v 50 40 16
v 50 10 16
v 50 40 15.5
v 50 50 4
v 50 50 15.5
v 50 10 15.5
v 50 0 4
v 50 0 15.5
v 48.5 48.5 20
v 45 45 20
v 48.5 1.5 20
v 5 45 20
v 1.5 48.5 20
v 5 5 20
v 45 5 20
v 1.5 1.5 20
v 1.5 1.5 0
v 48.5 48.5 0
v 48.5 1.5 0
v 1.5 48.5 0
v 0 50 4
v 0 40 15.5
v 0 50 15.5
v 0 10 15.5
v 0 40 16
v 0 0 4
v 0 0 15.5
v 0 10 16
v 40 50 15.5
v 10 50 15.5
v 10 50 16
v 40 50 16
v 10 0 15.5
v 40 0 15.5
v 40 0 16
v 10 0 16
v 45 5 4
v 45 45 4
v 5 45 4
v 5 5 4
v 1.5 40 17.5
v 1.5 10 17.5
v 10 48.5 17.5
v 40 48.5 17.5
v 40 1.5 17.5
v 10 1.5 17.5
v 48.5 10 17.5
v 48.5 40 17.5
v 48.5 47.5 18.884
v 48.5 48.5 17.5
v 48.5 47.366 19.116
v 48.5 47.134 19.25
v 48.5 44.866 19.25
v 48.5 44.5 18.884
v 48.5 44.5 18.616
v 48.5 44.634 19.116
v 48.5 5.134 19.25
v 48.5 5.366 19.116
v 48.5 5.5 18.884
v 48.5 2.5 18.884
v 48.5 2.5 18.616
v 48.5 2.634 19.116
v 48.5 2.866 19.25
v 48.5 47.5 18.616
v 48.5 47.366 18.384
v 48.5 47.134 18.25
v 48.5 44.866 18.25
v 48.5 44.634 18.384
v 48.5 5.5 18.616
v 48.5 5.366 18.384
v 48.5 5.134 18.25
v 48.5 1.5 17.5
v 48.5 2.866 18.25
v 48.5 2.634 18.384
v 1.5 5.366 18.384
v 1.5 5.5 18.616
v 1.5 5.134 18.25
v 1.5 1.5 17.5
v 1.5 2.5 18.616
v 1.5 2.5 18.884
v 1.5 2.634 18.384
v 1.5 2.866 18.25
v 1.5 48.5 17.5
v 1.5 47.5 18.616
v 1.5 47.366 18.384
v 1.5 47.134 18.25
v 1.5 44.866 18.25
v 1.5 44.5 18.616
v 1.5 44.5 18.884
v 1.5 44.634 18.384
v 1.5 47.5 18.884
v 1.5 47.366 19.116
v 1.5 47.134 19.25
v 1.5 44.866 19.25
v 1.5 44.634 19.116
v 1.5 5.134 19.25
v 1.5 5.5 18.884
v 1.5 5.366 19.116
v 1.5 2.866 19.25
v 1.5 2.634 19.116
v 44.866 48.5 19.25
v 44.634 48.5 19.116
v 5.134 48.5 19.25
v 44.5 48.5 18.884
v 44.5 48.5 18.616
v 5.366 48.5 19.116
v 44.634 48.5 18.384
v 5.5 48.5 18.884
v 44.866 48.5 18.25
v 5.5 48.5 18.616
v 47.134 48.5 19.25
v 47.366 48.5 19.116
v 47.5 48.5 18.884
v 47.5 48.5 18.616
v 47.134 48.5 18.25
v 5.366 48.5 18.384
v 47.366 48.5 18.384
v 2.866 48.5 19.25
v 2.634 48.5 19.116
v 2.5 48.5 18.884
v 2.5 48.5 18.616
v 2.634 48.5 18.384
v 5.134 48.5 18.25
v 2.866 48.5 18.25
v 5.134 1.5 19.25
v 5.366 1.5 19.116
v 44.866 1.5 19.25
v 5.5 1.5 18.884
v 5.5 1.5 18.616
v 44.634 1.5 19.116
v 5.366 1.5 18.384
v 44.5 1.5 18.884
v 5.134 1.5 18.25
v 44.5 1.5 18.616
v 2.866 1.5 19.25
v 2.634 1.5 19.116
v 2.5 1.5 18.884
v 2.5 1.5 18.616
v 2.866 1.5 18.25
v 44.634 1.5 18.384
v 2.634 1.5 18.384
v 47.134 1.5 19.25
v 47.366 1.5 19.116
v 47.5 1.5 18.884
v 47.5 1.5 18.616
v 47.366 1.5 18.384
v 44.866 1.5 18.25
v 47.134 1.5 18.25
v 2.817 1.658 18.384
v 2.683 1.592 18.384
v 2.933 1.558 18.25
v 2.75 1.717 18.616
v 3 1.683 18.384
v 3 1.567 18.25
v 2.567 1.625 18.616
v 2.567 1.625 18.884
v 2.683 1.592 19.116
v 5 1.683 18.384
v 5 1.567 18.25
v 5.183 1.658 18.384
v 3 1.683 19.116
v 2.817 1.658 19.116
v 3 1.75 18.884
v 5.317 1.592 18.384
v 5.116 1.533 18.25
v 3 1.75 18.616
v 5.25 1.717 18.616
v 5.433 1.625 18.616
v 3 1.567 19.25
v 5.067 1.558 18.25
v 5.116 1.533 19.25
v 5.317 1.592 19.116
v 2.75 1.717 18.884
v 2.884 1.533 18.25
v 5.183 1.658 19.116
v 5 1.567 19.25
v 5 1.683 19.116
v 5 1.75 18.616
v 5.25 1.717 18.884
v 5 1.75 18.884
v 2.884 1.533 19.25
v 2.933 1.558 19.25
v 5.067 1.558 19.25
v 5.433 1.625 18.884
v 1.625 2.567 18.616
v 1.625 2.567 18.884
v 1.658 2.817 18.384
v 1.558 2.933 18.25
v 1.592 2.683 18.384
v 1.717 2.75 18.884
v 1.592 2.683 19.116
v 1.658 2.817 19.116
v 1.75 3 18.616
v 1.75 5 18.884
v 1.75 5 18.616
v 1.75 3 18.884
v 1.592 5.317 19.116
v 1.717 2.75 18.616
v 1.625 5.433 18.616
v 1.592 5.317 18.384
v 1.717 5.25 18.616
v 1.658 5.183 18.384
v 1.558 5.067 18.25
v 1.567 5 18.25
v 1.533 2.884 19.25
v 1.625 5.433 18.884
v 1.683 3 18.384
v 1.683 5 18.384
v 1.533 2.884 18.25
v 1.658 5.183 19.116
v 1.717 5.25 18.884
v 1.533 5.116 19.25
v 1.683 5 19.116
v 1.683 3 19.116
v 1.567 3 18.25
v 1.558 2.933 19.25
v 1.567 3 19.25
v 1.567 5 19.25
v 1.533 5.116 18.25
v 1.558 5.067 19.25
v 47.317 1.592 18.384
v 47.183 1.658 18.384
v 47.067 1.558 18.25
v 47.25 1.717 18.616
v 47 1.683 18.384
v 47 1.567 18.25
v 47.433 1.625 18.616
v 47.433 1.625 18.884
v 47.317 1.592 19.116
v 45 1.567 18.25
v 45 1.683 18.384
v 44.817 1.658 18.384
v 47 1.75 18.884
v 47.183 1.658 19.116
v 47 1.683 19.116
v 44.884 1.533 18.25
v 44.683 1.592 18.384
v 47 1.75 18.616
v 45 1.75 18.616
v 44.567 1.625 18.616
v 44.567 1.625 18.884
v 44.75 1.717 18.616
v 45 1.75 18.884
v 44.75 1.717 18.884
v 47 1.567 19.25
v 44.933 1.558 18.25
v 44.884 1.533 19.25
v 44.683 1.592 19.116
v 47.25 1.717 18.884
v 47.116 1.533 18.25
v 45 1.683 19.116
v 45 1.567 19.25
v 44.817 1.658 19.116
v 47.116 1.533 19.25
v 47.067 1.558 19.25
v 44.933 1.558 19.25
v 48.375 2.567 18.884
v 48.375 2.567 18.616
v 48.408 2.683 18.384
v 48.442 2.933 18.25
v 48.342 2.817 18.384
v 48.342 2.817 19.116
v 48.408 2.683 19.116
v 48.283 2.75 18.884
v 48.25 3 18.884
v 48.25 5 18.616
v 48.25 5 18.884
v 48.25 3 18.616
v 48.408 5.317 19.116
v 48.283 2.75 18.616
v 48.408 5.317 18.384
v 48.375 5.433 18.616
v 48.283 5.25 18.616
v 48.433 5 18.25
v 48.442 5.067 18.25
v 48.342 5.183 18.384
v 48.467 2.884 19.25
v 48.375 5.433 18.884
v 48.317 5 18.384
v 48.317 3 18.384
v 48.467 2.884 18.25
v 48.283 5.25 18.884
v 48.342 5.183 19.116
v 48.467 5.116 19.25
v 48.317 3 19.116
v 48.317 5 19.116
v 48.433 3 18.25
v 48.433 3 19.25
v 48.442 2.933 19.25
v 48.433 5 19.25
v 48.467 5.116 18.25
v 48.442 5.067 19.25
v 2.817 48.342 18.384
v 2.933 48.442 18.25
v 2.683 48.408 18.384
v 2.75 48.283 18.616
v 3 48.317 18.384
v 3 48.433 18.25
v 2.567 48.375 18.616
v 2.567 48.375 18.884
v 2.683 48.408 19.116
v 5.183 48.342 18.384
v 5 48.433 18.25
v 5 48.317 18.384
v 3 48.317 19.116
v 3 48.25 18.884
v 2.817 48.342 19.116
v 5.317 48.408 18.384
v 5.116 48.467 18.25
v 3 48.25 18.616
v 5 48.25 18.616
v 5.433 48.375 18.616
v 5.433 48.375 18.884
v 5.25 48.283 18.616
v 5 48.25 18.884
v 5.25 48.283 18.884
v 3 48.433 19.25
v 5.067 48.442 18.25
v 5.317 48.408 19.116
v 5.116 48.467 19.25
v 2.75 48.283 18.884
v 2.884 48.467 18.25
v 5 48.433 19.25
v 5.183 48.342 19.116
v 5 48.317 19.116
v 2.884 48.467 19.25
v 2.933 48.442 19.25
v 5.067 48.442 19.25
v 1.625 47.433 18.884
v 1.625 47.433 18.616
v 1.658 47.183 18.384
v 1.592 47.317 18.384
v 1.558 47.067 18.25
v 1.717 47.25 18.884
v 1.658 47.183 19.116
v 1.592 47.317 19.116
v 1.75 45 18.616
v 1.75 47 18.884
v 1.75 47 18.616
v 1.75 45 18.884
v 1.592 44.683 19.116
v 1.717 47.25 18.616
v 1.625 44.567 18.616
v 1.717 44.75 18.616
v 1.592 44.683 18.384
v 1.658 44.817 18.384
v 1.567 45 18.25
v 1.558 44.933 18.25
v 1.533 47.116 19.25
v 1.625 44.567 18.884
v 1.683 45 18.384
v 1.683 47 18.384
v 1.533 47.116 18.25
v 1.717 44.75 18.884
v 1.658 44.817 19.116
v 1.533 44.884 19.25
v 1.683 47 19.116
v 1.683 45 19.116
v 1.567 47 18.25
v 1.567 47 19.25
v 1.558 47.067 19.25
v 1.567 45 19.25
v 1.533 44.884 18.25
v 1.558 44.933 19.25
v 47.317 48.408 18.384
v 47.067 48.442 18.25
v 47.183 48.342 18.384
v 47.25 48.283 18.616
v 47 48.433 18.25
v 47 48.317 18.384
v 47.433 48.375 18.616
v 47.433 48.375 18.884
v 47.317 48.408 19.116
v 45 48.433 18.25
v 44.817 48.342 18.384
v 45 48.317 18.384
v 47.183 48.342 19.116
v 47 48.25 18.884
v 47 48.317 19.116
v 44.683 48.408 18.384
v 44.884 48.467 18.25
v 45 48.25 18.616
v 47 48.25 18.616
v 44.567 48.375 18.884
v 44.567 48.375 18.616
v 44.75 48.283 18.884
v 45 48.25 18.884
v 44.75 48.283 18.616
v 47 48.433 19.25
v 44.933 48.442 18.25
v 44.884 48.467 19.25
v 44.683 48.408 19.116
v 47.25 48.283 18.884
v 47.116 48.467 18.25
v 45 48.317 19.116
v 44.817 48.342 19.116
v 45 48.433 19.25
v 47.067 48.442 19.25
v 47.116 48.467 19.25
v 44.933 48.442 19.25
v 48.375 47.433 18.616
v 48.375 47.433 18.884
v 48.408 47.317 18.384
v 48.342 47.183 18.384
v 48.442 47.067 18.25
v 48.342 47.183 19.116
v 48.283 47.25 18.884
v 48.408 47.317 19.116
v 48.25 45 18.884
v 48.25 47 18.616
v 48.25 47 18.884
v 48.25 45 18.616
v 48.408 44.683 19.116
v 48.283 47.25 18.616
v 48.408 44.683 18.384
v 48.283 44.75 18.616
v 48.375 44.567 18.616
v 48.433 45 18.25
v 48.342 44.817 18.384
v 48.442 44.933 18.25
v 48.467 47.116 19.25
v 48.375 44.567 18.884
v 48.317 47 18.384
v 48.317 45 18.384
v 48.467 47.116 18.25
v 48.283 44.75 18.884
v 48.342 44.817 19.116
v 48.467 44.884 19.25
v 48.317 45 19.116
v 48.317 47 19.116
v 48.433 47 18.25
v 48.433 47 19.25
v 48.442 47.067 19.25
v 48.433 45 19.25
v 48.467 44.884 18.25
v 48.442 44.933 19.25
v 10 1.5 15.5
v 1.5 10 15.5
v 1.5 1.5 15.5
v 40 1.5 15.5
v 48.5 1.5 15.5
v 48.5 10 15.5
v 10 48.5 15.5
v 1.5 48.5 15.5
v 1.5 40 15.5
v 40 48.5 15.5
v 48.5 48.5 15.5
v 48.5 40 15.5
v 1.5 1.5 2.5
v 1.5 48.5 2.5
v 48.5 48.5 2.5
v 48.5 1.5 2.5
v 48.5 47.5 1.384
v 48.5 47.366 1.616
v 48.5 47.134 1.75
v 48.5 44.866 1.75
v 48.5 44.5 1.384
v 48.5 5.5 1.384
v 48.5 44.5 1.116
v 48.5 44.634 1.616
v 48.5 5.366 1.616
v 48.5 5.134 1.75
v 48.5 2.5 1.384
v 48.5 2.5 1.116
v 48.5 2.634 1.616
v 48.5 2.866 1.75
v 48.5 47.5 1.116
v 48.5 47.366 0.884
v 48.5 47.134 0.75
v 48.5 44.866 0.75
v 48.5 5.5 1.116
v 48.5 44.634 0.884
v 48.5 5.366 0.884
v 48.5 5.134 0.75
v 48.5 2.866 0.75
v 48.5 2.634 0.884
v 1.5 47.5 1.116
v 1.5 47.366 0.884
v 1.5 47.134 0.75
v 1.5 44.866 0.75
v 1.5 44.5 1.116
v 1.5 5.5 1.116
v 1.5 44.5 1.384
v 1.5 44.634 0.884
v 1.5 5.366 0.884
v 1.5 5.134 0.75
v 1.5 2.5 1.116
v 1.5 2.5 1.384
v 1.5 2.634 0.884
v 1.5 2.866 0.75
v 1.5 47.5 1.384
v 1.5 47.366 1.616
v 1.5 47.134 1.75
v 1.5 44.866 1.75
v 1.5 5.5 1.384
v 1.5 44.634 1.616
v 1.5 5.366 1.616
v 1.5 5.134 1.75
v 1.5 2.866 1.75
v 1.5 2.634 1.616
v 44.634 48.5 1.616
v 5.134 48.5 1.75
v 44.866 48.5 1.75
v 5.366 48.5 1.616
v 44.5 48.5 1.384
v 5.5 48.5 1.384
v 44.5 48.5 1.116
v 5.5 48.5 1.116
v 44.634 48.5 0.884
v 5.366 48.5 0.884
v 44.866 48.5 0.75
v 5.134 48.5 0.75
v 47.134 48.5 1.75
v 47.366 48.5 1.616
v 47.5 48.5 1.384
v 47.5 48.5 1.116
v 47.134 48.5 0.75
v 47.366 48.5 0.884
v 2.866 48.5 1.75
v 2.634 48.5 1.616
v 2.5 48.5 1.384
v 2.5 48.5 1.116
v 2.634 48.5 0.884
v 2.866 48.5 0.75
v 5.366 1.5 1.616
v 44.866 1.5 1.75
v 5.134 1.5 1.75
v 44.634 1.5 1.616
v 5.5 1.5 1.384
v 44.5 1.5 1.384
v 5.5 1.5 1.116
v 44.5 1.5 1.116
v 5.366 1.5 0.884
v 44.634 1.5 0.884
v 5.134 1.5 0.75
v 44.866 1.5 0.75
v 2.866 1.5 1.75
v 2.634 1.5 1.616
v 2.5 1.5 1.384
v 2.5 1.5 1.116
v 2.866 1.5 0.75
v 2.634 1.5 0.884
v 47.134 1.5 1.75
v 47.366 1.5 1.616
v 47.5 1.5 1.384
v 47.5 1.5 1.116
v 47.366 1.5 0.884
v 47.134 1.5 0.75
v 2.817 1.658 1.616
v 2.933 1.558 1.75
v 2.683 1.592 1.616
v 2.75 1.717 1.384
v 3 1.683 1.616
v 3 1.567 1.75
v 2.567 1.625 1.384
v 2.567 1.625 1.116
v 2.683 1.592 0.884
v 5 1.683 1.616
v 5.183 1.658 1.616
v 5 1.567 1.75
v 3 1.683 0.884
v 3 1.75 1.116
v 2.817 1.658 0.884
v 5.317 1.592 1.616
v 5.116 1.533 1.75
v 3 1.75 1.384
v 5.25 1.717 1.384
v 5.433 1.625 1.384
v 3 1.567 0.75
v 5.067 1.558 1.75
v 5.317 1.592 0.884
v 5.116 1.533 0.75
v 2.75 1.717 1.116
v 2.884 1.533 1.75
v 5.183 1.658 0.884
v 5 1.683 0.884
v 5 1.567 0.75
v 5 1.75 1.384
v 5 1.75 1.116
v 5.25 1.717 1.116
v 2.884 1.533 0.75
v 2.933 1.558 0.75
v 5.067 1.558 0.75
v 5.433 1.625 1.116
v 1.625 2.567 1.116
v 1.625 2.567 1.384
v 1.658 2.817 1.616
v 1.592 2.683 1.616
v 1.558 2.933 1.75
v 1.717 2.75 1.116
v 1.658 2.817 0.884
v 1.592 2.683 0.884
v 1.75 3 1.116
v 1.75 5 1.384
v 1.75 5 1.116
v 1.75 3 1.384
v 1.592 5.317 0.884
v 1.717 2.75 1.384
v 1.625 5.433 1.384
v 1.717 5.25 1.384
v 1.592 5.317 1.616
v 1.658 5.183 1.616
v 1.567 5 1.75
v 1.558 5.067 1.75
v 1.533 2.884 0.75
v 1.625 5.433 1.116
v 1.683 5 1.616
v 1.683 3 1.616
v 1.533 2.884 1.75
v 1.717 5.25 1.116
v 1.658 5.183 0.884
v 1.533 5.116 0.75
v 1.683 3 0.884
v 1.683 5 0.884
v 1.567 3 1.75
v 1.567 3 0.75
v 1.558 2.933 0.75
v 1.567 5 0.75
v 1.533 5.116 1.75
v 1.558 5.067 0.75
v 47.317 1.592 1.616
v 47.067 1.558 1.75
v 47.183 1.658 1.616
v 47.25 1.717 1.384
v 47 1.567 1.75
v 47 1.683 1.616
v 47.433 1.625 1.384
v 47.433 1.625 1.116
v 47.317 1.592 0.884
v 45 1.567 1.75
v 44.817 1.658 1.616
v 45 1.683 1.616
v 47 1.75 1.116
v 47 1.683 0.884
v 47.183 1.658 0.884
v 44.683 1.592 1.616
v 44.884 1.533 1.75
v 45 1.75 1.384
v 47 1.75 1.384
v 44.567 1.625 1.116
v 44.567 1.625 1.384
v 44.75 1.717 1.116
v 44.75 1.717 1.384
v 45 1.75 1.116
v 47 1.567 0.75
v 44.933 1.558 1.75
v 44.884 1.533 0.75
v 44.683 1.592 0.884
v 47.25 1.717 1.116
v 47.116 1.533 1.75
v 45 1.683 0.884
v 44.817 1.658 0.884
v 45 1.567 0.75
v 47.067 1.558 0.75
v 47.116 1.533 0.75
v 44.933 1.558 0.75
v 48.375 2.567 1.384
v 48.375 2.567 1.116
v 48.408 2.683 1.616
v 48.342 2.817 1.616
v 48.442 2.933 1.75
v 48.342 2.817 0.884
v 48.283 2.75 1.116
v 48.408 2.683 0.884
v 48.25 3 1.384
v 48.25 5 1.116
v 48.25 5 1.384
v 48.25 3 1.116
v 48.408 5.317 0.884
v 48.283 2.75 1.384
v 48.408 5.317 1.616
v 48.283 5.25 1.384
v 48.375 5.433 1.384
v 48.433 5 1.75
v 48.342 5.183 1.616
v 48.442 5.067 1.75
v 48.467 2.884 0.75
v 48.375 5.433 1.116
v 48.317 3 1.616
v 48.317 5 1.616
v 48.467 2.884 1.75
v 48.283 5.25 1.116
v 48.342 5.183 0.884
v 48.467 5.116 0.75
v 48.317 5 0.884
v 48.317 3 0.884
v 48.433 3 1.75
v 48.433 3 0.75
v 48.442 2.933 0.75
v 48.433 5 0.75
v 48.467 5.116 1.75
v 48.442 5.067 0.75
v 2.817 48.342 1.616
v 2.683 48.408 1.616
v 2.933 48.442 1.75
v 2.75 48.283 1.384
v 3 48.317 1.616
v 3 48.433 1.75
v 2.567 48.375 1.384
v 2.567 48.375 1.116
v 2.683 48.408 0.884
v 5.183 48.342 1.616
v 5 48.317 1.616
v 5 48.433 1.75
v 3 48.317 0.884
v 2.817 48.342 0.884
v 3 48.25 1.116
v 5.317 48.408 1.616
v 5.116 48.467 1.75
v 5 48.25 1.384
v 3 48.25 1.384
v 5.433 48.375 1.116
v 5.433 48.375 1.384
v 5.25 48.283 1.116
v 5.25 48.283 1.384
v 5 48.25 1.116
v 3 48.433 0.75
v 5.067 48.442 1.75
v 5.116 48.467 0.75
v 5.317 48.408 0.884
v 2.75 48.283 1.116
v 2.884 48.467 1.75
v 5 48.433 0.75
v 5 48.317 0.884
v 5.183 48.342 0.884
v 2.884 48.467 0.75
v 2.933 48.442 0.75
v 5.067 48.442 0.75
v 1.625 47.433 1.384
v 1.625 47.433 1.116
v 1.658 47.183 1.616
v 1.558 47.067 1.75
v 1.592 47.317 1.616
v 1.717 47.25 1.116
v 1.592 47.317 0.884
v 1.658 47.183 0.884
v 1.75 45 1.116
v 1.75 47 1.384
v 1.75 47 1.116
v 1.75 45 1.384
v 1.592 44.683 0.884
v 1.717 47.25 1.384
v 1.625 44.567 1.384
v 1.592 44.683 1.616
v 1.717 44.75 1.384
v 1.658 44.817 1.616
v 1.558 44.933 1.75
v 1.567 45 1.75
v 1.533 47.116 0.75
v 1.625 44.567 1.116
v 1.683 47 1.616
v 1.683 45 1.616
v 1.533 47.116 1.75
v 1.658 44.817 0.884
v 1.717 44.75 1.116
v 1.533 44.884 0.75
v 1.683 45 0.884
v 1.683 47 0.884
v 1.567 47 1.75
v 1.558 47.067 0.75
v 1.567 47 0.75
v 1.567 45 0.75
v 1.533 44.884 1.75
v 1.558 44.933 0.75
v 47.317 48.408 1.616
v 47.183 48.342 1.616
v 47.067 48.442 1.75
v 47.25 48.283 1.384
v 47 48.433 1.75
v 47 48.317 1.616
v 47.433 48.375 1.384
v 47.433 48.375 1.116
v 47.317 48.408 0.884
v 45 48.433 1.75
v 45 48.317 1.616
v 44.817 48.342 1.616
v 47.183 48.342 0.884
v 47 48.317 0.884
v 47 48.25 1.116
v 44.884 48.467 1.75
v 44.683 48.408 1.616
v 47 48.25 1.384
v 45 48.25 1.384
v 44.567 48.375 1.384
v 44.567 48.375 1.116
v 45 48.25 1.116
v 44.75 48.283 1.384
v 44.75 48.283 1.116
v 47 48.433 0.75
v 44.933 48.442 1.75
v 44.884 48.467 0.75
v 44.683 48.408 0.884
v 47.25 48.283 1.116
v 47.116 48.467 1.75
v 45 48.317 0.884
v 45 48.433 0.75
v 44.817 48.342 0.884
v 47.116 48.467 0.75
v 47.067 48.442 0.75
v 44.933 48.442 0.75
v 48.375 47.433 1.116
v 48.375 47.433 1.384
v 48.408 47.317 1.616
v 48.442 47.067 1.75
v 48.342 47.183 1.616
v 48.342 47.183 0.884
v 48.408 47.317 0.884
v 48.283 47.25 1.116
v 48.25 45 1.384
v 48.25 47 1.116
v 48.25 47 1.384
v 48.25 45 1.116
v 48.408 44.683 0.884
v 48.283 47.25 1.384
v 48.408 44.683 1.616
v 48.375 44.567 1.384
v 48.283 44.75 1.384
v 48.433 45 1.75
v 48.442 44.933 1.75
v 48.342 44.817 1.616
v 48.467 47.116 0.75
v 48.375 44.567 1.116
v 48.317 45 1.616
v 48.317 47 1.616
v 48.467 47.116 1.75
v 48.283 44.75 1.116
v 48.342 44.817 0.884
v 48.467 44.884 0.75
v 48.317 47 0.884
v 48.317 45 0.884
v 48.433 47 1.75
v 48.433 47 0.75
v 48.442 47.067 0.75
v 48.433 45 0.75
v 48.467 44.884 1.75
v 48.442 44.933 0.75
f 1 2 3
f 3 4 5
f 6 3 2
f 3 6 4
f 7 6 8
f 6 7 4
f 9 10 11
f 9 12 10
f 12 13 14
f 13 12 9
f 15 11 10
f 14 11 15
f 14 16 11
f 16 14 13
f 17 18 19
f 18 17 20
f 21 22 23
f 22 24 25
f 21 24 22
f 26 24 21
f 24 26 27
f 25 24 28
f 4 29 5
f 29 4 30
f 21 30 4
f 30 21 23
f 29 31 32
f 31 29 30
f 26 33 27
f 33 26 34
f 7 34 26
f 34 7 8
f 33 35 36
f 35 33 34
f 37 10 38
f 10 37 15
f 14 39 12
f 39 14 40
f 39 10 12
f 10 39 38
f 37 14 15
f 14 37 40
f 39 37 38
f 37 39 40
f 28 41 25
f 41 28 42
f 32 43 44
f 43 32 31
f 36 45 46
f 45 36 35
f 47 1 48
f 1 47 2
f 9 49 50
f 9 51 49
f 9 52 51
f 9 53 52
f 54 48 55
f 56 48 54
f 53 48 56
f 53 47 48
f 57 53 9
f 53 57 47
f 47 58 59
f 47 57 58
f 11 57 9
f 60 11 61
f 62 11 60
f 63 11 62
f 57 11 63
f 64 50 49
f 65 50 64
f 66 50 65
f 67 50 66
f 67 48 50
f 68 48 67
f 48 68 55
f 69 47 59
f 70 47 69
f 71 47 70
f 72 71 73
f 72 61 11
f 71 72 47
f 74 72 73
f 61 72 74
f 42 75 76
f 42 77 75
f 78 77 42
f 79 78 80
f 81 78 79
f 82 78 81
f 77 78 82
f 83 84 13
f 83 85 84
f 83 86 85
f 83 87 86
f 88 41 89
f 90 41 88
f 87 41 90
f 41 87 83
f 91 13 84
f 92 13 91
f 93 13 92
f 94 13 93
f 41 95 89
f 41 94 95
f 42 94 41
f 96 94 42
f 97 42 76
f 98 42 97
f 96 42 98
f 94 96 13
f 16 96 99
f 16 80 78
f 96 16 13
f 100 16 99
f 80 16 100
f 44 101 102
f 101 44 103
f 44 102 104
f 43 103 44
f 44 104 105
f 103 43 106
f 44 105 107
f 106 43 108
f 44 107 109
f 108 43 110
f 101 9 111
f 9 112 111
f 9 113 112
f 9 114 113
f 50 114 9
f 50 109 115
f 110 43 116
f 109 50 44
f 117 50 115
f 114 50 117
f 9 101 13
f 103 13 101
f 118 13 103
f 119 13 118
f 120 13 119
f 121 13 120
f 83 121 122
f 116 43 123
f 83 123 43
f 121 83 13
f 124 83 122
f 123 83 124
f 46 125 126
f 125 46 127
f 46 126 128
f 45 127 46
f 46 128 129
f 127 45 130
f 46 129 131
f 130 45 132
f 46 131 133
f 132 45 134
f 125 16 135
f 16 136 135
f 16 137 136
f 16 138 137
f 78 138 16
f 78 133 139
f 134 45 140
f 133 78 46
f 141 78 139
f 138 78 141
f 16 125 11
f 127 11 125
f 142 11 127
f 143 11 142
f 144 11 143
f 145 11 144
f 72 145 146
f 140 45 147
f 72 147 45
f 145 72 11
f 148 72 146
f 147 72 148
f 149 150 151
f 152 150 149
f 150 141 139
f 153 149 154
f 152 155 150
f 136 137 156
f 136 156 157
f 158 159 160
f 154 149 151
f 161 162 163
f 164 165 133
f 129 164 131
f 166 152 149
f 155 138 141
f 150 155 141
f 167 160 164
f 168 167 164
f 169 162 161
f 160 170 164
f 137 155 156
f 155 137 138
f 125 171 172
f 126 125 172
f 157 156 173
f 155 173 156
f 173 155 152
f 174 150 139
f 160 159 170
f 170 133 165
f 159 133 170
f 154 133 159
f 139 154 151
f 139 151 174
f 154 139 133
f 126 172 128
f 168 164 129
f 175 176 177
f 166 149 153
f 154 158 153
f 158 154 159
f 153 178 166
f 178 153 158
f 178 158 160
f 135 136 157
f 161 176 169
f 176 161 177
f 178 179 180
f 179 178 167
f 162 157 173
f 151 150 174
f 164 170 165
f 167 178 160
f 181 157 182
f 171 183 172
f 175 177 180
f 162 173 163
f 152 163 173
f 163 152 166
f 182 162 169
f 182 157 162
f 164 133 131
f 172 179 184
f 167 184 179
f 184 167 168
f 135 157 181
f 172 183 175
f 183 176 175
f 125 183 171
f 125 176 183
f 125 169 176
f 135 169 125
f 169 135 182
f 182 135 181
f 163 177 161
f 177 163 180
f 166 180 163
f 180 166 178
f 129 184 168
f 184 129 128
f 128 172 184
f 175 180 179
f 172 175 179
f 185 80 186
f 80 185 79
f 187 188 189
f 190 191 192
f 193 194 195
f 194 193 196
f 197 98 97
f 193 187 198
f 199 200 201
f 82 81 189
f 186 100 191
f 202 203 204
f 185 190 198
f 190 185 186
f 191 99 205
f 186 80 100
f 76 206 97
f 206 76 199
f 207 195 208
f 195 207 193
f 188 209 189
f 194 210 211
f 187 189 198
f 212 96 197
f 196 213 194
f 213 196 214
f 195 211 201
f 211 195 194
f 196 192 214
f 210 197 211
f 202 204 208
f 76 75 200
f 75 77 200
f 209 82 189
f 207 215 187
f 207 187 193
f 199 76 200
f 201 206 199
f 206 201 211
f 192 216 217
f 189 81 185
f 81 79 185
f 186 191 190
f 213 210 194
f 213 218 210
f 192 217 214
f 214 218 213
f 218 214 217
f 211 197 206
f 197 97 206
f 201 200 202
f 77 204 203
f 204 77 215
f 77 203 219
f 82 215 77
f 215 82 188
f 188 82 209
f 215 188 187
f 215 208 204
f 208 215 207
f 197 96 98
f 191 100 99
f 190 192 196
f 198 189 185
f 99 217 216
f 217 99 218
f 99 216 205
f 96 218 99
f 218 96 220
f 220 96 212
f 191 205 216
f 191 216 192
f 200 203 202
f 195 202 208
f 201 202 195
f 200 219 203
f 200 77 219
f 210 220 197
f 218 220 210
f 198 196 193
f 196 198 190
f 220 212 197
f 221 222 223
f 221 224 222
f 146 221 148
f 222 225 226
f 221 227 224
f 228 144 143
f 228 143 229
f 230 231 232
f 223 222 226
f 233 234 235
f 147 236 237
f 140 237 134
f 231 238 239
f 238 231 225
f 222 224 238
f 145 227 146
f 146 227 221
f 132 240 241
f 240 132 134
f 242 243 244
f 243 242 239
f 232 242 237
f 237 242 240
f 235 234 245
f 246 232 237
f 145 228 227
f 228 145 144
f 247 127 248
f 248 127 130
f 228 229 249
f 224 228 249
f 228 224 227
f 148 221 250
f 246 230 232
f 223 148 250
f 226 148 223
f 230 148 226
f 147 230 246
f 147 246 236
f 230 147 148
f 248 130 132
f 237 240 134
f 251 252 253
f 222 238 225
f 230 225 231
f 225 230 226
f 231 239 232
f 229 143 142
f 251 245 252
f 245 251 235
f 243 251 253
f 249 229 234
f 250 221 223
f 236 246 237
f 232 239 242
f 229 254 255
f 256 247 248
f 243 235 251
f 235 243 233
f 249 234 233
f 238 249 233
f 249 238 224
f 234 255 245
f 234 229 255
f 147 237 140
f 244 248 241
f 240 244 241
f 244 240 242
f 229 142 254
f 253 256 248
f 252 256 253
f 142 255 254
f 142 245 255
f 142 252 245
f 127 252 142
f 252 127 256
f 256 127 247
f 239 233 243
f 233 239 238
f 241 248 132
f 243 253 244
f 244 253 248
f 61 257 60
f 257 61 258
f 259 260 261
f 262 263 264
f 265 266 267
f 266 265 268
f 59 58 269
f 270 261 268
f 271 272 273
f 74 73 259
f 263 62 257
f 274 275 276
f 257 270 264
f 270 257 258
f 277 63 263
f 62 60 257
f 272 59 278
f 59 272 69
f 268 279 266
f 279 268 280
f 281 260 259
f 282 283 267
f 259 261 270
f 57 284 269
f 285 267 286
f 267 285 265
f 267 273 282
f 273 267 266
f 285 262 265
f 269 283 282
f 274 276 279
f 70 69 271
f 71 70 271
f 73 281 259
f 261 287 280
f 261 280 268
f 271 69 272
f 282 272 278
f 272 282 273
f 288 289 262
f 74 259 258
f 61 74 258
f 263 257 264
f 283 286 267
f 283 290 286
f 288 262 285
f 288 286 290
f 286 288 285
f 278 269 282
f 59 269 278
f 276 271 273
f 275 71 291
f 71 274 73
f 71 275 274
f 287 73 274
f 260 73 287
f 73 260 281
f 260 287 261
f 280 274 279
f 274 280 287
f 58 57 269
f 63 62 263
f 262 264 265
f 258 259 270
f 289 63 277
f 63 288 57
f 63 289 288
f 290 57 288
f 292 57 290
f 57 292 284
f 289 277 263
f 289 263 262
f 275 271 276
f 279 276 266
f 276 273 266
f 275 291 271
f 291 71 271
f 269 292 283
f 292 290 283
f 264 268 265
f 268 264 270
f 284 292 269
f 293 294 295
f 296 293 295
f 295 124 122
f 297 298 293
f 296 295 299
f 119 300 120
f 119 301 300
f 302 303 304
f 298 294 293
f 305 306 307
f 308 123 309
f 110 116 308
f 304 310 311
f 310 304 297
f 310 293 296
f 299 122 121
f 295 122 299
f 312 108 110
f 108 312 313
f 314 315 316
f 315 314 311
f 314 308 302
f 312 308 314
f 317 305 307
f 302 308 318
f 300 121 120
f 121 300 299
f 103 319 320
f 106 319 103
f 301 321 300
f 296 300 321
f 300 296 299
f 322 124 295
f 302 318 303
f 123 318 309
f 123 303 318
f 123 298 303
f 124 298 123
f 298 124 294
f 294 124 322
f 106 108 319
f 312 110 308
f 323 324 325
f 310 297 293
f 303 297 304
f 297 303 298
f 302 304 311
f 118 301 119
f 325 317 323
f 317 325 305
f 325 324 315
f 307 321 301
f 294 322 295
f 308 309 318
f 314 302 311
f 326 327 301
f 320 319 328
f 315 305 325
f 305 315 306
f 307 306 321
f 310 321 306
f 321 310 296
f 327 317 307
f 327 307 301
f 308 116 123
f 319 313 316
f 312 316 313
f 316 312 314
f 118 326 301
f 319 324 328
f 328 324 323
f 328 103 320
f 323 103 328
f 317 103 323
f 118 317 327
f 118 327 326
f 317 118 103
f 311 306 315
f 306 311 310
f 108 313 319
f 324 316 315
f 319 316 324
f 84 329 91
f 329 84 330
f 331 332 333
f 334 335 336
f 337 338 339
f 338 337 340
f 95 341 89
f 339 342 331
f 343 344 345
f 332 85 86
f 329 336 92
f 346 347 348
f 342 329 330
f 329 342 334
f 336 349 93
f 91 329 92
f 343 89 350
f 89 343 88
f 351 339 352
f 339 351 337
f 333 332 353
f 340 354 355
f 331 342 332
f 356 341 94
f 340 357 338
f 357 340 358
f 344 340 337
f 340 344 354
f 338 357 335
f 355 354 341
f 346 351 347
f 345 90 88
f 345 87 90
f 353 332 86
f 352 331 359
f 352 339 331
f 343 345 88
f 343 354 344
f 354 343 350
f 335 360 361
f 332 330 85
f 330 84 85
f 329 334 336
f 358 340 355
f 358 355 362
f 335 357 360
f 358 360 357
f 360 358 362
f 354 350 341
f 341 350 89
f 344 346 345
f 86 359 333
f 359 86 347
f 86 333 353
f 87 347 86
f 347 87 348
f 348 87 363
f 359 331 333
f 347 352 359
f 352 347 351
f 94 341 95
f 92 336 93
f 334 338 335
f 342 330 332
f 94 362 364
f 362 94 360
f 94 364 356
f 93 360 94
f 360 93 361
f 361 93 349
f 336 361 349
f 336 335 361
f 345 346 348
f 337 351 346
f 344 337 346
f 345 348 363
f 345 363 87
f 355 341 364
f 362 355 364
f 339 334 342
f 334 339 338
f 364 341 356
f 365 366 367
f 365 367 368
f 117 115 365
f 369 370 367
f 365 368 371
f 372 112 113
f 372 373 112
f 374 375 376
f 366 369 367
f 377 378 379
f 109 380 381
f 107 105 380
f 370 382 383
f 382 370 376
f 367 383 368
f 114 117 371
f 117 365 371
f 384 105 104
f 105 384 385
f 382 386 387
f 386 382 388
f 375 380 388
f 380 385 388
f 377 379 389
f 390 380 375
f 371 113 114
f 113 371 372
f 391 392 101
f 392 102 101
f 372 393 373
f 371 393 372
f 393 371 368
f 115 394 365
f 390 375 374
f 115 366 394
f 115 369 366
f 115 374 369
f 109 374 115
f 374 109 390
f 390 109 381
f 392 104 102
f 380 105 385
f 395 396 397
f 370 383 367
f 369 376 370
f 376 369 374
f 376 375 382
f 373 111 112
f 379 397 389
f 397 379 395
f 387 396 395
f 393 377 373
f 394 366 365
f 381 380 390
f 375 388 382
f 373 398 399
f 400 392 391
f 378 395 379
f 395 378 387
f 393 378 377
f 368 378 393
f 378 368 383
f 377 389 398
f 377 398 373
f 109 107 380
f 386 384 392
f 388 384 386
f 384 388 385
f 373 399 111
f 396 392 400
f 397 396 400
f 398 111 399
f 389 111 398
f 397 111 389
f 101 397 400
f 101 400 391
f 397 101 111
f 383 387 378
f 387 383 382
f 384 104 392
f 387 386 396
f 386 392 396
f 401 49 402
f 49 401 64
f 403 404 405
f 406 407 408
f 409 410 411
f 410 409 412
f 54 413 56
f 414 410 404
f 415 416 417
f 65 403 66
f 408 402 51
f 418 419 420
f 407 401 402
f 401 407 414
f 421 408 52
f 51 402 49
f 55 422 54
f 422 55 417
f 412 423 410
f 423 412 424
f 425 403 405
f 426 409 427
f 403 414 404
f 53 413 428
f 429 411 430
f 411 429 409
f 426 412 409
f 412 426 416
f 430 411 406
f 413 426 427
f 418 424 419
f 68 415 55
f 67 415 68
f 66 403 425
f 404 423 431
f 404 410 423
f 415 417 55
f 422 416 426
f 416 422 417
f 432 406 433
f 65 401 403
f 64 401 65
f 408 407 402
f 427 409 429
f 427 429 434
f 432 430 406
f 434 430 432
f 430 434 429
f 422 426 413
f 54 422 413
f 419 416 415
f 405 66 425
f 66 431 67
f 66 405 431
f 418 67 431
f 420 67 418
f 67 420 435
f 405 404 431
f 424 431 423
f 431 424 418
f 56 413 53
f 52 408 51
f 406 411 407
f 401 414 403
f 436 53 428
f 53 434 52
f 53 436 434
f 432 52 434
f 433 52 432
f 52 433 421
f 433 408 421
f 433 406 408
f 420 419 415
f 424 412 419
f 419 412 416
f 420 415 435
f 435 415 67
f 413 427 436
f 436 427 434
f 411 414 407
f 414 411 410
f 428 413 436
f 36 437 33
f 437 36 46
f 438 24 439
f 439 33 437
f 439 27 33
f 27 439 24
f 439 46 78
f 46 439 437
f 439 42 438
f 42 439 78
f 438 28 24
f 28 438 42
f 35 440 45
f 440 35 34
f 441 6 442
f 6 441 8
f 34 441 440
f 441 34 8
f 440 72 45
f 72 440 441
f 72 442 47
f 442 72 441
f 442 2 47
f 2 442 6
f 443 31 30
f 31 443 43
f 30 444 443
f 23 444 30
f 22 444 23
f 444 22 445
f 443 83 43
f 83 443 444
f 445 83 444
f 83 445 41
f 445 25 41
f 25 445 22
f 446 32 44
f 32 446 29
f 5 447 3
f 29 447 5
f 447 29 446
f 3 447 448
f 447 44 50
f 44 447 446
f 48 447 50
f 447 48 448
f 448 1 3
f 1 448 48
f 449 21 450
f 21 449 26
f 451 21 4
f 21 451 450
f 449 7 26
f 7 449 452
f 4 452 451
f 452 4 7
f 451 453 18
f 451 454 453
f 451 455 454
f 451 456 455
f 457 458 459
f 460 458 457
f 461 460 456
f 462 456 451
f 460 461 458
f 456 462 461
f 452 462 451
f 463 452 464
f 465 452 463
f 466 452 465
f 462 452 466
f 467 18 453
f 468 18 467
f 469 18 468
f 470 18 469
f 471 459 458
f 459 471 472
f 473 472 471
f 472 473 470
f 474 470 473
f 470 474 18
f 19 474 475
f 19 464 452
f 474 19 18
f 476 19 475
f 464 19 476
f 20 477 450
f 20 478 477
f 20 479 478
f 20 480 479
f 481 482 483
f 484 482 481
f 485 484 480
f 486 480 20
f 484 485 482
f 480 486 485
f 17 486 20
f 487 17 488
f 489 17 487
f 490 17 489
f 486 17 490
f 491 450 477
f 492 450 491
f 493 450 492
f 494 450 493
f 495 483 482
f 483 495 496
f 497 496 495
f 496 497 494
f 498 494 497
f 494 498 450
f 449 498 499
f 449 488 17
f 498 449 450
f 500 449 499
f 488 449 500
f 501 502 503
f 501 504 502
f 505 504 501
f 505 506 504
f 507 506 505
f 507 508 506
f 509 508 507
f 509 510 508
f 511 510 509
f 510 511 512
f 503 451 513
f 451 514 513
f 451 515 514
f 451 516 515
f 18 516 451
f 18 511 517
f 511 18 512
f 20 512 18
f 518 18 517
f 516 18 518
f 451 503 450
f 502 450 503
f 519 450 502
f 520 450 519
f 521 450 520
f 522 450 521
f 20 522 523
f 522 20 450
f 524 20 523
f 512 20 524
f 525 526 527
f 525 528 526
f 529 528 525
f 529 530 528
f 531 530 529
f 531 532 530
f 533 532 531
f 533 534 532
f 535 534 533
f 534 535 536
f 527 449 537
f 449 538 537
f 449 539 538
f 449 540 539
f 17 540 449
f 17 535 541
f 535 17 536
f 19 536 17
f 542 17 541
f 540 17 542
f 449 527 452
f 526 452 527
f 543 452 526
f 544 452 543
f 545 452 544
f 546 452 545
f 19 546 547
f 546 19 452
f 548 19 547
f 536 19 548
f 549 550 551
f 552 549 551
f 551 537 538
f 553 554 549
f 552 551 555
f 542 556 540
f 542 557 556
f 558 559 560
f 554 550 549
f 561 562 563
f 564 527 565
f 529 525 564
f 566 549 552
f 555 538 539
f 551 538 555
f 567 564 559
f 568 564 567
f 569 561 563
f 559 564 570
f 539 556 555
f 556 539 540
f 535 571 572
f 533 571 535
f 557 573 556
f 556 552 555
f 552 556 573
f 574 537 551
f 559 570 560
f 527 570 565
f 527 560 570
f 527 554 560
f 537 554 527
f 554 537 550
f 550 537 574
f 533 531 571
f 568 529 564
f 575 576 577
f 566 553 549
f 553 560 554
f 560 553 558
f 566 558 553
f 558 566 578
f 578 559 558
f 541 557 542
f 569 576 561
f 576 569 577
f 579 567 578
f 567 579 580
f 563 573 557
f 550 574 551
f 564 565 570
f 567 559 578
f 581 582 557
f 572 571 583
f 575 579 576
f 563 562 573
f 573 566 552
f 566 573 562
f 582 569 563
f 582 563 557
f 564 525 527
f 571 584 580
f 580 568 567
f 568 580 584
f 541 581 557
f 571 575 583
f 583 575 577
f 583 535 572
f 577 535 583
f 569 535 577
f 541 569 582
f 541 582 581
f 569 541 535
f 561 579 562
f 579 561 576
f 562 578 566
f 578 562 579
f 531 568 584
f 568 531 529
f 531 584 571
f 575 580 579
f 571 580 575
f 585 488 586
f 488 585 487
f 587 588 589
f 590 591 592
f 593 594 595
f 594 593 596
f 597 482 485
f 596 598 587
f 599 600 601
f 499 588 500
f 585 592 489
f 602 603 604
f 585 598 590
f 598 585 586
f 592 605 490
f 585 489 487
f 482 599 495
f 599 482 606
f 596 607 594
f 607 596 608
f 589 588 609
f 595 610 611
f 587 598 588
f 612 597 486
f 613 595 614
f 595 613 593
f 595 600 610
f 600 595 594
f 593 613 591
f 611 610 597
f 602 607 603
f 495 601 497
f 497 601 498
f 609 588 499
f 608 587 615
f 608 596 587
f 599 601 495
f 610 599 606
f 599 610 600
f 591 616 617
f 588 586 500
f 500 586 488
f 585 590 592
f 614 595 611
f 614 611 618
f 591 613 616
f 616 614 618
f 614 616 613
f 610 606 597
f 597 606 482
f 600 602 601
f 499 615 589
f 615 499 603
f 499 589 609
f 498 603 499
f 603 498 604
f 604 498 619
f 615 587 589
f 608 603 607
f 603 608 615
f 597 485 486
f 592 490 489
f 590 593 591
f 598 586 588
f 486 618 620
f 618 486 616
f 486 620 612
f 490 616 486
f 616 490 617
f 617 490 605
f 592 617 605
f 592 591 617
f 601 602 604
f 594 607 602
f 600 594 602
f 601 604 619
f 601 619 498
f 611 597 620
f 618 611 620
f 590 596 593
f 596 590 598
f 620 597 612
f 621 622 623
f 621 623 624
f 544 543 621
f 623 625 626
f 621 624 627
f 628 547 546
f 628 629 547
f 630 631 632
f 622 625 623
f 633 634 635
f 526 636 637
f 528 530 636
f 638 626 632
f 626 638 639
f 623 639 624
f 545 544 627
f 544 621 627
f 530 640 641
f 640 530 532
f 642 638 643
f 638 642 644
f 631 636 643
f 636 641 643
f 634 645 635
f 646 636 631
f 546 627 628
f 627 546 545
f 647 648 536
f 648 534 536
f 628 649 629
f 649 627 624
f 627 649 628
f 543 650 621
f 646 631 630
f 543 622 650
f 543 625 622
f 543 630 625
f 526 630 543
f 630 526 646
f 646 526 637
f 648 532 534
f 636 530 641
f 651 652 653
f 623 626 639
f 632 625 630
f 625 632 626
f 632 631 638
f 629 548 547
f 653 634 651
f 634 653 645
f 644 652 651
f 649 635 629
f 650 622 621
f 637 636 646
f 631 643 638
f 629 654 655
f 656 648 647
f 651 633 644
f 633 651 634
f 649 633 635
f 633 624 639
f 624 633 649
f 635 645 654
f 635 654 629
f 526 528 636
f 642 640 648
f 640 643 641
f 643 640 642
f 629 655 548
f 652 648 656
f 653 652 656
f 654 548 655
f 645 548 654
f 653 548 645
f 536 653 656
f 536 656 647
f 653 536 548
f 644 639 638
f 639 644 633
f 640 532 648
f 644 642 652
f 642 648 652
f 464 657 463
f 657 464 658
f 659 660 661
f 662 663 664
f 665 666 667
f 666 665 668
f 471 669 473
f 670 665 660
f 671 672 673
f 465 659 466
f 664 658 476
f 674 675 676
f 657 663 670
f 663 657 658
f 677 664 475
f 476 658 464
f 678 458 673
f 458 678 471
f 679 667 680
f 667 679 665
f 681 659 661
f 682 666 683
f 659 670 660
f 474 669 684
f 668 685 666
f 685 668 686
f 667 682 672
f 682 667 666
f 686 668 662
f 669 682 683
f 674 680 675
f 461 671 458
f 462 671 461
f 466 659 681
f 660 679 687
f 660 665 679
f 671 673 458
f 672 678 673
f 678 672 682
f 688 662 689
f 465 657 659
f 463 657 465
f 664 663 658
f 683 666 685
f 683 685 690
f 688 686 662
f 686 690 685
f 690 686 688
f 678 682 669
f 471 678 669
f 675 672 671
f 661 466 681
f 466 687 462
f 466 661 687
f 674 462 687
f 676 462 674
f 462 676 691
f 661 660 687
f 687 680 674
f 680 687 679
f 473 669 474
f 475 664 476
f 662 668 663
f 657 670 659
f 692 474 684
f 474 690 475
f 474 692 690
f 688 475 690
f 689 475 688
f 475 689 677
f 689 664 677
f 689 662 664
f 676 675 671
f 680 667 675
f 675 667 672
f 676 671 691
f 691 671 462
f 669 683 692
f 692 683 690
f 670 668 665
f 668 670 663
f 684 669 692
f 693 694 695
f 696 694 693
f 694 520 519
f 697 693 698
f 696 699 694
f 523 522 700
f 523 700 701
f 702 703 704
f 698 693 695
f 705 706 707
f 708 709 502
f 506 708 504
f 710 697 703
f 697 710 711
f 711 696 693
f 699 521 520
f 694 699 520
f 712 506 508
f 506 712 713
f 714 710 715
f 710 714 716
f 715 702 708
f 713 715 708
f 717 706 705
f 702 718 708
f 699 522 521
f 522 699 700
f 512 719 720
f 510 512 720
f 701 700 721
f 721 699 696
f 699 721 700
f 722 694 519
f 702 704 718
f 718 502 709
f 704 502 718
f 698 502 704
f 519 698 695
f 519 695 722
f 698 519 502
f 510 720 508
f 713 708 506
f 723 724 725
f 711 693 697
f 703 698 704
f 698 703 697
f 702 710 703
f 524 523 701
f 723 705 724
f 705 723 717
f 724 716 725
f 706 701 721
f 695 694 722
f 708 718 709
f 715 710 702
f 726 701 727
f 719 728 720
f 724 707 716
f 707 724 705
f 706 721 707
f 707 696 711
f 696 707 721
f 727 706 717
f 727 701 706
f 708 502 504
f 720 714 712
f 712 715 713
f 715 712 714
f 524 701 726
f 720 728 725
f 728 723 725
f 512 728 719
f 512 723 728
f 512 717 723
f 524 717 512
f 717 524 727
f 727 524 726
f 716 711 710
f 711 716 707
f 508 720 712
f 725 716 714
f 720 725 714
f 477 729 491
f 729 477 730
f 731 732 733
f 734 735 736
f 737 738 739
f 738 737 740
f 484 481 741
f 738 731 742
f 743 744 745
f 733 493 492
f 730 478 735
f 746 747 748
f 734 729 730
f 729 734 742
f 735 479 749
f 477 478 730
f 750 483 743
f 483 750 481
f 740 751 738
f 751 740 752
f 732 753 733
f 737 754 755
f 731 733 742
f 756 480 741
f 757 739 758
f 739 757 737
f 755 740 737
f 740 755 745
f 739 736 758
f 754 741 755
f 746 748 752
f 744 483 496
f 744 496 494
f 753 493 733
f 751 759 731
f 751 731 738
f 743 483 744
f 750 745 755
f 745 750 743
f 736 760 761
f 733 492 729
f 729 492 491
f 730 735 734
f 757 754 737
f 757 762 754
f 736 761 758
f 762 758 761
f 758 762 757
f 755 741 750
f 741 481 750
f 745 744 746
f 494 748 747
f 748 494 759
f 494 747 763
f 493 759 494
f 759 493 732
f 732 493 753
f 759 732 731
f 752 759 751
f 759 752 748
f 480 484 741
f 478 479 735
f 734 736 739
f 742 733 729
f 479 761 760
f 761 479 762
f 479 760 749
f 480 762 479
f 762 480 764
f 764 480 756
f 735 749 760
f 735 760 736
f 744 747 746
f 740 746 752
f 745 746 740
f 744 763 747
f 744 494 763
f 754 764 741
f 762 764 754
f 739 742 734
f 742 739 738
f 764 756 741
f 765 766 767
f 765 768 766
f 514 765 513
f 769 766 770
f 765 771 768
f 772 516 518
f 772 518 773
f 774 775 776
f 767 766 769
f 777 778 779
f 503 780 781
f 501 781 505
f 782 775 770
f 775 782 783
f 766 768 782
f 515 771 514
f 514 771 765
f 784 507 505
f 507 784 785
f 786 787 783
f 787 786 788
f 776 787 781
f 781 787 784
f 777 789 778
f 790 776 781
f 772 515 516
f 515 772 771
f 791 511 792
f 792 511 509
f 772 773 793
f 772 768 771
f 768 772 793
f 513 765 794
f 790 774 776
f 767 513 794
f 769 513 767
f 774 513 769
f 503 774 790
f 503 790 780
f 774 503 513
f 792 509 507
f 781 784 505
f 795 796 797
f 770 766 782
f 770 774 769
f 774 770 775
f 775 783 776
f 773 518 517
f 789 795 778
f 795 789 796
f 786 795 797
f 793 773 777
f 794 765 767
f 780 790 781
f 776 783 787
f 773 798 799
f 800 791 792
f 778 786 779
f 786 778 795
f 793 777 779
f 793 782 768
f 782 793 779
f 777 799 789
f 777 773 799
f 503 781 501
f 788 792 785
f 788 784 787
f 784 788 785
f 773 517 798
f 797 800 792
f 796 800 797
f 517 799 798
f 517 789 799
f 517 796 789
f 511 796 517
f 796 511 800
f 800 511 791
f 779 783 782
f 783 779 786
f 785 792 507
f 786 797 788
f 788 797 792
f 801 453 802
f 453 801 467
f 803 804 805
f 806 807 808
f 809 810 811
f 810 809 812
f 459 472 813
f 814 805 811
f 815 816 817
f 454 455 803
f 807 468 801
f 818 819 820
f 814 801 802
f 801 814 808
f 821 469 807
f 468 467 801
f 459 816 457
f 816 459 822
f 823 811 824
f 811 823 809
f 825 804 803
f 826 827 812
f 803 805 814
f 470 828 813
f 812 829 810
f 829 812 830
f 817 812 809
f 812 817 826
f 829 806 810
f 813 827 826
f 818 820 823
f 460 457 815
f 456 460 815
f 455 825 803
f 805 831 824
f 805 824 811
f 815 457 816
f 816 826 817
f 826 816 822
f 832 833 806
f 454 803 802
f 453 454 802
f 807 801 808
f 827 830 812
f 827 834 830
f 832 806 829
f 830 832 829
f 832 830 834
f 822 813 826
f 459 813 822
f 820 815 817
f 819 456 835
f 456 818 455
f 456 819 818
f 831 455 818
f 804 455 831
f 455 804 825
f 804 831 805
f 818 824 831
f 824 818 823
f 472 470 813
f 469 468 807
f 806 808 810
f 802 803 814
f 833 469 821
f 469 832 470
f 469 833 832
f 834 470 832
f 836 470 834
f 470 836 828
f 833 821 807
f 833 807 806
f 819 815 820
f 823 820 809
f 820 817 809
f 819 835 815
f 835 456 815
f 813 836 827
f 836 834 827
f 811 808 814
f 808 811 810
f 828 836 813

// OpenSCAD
// Test: Different wall thickness values
include <../boardgame_insert_toolkit_lib.3.scad>;

g_b_print_lid = false;
g_b_print_box = true;
g_isolated_print_box = "";
g_wall_thickness = 3.0;

data = [
    [ "thick walls",
        [
            [ BOX_SIZE_XYZ, [50, 50, 20] ],
            [ BOX_COMPONENT,
                [
                    [ CMP_COMPARTMENT_SIZE_XYZ, [40, 40, 16] ],
                ]
            ]
        ]
    ],
];

MakeAll();
